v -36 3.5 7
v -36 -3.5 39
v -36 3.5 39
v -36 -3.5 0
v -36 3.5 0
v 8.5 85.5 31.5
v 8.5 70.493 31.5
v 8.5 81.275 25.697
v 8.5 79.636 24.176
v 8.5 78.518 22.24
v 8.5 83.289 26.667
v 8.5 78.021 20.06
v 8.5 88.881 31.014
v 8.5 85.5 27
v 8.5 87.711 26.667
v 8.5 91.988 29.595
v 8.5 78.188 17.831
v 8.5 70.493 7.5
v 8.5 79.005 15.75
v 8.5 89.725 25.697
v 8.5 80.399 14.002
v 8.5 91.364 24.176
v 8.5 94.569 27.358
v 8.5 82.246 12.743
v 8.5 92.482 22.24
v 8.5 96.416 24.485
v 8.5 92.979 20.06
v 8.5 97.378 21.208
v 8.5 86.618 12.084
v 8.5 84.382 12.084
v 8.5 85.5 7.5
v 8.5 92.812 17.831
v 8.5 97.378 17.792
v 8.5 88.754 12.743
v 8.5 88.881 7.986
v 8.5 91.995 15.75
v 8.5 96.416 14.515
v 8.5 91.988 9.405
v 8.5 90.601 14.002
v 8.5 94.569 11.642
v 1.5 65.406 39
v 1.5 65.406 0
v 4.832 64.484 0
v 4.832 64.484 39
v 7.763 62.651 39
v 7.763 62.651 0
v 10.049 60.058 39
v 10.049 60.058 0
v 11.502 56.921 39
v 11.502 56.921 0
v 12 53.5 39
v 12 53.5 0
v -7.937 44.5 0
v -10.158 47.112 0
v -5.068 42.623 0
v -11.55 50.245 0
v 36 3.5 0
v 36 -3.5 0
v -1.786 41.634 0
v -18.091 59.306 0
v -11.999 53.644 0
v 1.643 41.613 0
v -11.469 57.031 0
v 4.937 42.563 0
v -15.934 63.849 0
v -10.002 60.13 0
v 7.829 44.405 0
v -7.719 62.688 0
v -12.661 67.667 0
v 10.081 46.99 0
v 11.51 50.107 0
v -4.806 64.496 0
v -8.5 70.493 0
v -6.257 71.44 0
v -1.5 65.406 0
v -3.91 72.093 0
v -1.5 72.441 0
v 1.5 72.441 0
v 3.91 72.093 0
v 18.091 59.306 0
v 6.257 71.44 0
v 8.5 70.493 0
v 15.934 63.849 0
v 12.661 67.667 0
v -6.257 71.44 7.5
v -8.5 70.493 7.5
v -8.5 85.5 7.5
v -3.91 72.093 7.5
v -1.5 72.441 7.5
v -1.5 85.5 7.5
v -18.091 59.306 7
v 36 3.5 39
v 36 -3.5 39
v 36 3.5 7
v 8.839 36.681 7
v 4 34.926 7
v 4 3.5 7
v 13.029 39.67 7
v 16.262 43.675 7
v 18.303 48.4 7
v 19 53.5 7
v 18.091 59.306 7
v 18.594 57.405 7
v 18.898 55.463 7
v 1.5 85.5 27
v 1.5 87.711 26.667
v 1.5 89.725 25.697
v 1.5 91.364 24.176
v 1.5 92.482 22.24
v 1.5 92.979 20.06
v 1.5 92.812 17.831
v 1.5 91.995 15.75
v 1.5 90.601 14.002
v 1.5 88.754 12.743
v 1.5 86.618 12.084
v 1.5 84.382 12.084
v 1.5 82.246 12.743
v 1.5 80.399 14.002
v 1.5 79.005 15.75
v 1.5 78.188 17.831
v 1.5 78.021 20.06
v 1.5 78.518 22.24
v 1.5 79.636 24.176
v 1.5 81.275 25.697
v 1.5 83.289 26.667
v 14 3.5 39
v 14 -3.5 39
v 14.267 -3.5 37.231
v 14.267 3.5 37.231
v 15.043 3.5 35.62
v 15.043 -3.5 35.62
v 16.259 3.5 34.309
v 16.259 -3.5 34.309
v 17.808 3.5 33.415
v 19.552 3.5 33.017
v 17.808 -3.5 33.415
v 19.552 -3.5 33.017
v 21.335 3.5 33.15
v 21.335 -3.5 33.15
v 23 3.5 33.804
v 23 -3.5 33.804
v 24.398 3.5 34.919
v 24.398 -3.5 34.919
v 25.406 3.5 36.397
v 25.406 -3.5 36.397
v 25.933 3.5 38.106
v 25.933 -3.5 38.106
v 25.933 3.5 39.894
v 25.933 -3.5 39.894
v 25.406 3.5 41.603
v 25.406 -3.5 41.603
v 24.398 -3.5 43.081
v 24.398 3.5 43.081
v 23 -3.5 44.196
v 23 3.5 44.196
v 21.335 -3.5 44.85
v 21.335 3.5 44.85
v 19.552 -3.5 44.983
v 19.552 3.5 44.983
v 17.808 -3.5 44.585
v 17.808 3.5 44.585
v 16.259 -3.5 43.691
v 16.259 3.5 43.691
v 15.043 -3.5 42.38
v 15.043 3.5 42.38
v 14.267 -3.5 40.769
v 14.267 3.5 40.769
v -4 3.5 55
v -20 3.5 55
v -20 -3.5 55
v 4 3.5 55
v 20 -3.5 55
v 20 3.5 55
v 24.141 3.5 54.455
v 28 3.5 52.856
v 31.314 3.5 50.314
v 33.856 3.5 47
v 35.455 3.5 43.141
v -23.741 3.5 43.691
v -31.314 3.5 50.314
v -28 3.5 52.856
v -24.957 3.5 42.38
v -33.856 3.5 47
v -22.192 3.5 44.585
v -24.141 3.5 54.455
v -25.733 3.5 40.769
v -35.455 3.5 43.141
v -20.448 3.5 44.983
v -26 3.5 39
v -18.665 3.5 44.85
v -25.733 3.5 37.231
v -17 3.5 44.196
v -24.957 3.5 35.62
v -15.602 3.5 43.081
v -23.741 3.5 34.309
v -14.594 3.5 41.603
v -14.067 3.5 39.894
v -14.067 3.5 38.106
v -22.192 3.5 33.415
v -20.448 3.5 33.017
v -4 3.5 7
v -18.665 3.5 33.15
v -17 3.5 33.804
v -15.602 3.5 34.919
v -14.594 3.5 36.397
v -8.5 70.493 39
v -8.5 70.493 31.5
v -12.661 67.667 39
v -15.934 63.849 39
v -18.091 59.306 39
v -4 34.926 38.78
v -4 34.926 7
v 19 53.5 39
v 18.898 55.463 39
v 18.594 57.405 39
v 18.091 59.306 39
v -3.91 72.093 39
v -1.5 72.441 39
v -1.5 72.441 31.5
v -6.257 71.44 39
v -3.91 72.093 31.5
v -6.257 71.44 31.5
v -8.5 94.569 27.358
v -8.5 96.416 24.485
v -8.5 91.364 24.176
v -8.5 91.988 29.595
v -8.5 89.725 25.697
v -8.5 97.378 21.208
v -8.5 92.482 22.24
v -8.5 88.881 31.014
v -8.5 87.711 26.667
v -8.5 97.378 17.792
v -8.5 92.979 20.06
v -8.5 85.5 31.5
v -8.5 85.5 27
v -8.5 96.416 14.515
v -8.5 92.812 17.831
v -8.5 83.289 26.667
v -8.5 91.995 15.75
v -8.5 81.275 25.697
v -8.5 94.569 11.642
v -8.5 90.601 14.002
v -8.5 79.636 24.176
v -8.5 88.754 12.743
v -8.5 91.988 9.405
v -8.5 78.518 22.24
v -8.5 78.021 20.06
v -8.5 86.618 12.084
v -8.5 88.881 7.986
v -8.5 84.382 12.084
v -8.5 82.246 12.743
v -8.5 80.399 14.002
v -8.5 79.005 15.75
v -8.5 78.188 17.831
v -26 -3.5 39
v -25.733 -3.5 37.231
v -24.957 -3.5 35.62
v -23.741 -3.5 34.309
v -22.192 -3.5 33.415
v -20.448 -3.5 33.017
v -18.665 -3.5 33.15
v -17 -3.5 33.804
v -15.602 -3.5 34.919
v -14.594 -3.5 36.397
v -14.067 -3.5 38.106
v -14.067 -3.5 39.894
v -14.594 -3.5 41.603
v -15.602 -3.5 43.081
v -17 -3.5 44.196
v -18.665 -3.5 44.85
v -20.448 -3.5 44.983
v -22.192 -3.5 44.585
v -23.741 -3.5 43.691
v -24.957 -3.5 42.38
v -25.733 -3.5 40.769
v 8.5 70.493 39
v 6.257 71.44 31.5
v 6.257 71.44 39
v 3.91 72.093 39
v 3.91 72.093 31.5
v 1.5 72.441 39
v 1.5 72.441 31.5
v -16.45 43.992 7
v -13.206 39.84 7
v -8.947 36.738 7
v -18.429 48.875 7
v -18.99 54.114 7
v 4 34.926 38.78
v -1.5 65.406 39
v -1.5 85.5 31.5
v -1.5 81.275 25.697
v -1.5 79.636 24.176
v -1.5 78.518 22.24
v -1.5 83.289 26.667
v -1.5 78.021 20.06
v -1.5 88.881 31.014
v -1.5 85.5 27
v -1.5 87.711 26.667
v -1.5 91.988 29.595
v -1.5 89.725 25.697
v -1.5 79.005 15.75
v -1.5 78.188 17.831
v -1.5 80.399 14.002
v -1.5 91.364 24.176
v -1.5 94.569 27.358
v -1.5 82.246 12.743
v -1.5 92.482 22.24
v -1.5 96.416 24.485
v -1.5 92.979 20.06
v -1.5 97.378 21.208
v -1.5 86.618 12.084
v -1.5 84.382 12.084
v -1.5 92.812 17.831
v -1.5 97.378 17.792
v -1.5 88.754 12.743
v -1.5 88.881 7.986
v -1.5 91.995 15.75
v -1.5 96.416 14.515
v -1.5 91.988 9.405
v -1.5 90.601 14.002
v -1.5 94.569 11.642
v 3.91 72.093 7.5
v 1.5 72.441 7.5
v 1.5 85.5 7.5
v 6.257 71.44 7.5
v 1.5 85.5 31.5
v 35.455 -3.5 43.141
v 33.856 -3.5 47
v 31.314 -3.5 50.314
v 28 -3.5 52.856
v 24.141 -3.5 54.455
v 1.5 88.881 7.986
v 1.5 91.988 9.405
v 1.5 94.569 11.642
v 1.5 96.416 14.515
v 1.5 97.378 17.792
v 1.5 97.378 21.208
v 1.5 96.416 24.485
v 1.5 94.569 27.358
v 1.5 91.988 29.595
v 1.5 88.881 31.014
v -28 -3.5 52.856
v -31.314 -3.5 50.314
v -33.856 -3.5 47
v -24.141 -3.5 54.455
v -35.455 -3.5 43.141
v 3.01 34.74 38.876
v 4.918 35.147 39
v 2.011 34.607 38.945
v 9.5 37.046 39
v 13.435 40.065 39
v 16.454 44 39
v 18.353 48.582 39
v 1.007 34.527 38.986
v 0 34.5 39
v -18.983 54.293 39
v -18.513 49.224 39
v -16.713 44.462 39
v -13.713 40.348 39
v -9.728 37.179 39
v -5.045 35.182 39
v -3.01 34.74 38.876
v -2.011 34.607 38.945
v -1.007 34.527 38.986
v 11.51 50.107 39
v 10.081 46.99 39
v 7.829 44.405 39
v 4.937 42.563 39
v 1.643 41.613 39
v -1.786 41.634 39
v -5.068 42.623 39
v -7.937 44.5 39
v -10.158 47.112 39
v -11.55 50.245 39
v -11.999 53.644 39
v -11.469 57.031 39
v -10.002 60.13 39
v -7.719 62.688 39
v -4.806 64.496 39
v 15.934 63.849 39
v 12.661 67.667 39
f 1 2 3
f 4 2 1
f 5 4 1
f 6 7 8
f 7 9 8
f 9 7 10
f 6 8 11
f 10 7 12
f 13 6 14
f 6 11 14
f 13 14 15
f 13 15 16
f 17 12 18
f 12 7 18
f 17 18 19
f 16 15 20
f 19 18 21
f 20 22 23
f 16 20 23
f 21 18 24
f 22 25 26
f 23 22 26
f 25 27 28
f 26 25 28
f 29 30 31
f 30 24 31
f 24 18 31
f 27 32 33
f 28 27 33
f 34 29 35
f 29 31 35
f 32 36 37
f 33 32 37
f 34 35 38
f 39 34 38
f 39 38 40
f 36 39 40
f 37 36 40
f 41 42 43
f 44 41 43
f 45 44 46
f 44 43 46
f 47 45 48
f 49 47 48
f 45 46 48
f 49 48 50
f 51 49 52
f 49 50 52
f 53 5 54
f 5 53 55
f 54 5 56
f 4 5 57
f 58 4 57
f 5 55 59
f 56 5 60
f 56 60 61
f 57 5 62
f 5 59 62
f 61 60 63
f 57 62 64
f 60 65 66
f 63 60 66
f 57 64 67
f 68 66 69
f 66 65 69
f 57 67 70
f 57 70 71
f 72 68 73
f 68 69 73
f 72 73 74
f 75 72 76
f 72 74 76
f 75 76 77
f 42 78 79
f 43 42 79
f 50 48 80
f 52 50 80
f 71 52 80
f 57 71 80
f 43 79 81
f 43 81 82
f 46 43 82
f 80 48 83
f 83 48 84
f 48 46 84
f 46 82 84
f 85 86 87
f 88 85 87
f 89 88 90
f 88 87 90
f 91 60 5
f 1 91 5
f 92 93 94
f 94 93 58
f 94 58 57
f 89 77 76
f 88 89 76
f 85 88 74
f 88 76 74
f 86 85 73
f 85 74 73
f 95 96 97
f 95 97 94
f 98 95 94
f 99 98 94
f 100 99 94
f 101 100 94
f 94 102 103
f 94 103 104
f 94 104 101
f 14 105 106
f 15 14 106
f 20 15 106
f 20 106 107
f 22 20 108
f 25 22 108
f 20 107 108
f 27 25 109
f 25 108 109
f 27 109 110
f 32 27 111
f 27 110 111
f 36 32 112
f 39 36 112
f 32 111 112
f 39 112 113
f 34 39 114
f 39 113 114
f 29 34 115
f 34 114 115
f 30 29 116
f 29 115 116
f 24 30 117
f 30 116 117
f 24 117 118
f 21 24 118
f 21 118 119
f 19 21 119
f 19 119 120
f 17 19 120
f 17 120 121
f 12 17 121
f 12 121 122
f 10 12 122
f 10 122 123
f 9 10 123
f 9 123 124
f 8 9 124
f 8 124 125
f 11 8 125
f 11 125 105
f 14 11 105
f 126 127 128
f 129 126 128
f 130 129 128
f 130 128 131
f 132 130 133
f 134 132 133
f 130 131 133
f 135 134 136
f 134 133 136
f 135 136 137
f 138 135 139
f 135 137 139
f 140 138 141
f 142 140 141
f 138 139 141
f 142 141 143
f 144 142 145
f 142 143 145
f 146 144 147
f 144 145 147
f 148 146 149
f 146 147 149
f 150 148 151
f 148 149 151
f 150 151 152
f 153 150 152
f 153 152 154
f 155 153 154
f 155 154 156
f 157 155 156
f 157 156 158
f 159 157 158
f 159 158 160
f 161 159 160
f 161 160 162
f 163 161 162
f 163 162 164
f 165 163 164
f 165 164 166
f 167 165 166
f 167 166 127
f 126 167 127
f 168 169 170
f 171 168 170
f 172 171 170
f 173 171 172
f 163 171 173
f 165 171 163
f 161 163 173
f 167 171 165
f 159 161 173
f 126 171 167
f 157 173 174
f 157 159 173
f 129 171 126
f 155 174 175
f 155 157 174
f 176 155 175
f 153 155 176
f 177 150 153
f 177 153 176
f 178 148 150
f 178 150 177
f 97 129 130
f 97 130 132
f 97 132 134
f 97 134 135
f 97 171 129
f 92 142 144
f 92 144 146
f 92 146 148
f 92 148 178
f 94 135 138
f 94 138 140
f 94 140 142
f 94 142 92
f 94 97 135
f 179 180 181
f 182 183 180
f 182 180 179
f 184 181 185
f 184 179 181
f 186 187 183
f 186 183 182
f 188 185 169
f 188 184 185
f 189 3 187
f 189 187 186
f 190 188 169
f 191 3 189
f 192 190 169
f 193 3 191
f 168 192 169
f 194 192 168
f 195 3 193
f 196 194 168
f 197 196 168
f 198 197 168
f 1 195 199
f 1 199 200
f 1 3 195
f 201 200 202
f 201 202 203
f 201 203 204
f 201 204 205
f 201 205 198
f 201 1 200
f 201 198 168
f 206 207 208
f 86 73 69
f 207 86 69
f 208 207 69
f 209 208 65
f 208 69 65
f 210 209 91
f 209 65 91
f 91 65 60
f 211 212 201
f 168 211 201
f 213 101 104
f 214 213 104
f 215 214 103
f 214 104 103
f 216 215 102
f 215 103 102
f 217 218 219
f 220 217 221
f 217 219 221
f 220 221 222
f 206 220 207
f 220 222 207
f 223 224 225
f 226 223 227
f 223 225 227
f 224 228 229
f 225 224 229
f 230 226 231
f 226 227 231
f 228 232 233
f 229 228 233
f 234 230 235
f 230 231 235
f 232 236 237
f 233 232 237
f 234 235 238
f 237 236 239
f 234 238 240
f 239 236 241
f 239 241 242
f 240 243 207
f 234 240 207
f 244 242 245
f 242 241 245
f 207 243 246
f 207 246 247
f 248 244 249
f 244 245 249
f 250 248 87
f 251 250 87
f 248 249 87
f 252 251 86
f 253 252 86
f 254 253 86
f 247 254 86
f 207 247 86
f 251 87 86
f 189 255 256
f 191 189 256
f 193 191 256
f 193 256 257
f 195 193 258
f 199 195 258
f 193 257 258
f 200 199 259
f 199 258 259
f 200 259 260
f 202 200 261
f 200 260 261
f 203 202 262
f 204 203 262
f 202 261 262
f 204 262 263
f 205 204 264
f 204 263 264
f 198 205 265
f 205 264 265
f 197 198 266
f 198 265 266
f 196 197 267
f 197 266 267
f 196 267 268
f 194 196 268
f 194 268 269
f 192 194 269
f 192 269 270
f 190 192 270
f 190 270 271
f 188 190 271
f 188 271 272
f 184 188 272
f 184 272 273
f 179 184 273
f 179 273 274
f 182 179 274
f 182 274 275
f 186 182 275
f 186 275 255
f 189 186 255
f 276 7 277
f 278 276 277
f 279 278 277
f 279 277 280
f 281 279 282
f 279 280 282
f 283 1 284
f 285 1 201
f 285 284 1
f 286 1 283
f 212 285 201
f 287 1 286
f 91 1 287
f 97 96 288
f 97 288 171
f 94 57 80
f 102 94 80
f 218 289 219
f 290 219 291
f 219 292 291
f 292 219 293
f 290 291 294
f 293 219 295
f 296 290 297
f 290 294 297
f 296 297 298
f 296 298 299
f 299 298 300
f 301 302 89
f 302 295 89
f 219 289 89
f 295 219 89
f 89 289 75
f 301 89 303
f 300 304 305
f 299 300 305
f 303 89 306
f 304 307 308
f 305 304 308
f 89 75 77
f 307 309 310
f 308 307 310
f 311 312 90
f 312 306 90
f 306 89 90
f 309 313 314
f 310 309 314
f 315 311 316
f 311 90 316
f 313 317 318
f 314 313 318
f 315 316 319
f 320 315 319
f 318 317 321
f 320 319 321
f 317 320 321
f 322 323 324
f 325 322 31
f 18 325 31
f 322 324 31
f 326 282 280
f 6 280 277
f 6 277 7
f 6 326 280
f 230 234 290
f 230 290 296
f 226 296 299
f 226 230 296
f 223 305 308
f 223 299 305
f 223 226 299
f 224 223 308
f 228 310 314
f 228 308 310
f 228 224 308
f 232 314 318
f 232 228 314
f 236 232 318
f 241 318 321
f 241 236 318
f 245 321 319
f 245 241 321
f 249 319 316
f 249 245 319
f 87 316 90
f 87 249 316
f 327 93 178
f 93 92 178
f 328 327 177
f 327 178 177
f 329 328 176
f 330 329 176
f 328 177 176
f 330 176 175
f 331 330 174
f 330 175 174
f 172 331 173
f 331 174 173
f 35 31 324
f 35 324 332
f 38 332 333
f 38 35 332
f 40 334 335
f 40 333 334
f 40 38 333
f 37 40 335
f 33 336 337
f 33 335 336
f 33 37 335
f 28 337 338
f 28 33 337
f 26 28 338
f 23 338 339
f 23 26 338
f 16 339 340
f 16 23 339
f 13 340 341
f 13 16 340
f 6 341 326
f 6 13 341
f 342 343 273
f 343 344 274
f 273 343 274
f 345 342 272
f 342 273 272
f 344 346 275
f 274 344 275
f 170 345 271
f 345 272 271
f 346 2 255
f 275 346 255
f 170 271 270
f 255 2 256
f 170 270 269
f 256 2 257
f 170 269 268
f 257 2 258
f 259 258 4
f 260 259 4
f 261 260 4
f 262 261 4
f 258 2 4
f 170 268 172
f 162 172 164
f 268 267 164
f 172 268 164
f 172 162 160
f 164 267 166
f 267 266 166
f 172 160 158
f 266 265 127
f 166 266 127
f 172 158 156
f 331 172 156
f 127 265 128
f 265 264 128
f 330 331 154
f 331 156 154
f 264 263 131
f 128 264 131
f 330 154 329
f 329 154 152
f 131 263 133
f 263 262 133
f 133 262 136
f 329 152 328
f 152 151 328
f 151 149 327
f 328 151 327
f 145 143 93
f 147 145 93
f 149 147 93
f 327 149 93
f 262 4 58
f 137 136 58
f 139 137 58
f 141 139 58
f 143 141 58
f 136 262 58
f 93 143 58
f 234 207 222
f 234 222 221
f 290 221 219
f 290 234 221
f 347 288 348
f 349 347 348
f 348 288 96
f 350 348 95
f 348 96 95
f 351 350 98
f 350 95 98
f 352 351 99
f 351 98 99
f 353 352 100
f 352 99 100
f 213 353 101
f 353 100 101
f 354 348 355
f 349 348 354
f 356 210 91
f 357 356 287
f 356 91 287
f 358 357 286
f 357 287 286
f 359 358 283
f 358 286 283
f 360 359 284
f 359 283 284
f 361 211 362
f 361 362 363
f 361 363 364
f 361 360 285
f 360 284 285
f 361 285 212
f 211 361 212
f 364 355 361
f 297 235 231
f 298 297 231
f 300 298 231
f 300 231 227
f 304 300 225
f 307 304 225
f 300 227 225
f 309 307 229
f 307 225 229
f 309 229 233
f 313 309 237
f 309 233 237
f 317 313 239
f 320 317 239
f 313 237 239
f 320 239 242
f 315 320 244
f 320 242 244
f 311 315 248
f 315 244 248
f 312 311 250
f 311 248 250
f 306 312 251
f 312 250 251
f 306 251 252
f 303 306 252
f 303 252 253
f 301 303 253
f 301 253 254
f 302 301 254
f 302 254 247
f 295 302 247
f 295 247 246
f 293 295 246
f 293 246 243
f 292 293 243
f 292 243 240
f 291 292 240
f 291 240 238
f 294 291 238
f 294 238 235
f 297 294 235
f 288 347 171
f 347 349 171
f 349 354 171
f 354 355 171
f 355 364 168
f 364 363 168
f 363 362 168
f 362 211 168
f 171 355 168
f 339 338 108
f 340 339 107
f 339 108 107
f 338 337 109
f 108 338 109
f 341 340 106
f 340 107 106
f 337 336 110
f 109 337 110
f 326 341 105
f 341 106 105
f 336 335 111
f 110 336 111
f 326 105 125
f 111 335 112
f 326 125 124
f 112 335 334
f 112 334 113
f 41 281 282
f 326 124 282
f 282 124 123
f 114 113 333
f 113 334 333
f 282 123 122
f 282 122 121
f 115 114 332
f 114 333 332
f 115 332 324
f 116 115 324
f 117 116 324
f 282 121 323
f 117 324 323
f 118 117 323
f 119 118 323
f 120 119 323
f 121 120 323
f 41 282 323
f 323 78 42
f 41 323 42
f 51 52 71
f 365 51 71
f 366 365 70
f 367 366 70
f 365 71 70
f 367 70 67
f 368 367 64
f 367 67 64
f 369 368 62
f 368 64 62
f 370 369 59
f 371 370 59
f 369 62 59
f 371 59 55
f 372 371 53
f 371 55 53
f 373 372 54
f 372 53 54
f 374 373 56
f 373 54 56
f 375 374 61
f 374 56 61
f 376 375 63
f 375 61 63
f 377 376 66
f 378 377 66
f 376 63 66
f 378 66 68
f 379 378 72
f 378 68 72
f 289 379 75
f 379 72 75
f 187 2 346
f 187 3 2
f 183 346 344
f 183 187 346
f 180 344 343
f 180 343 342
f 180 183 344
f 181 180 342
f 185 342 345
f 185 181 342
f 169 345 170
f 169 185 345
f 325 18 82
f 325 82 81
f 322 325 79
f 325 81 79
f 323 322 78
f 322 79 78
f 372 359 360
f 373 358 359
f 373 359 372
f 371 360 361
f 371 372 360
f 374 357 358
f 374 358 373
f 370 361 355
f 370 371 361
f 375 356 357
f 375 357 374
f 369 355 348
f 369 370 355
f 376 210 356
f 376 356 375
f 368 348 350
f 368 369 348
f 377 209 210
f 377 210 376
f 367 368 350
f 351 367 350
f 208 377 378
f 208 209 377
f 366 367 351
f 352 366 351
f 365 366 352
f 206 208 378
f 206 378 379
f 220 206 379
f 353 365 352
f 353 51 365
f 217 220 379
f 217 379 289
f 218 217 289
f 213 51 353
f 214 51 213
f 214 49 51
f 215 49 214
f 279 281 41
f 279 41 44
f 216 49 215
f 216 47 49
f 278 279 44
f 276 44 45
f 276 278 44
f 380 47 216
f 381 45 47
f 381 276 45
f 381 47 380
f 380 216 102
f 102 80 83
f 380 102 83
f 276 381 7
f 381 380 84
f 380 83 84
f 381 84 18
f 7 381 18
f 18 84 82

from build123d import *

# Parameters (mm, degrees)
SKETCH1_W                  = 72
SKETCH1_H                  = 7
BOSS_EXTRUDE1_DEPTH        = 55
BOSS_EXTRUDE2_DEPTH        = 7
BOSS_EXTRUDE3_DEPTH        = 39
BOSS_EXTRUDE4_START        = 7.5
BOSS_EXTRUDE4_DEPTH        = 24
FILLET1_RADIUS             = 12
FILLET1_LENGTH             = 7
FILLET2_RADIUS             = 12
FILLET2_LENGTH             = 7
F_1_0MM_DOWEL_HOLE1_D      = 15
RIB1_REACH                 = 119.589
SKETCH4_WALL_W             = 272.06418258
SKETCH4_WALL_H             = 8
FILLET3_R                  = 16
F_12_0MM_DOWEL_HOLE1_D     = 12
F_12_0MM_DOWEL_HOLE1_DEPTH = 7


with BuildPart() as part:
    # Sketch1 → Boss-Extrude1 (new body)
    with BuildSketch(Plane.XY):
        Rectangle(SKETCH1_W, SKETCH1_H)
    extrude(amount=BOSS_EXTRUDE1_DEPTH)

    # Sketch1<3> → Boss-Extrude2 (add)
    with BuildSketch(Plane.XY):
        with BuildLine():
            ThreePointArc((19, 53.5), (-2.93819909, 34.728559296), (-18.091261695, 59.305708421))
            Line((-18.091261695, 59.305708421), (-36, 3.5))
            Line((-36, 3.5), (36, 3.5))
            Line((36, 3.5), (18.091261695, 59.305708421))
            ThreePointArc((18.091261695, 59.305708421), (18.771440704, 56.43819909), (19, 53.5))
        make_face()
    extrude(amount=BOSS_EXTRUDE2_DEPTH)

    # Sketch1<4> → Boss-Extrude3 (add)
    with BuildSketch(Plane.XY):
        with BuildLine():
            ThreePointArc((-8.5, 70.492645468), (-14.424308987, 65.866863395), (-18.091261695, 59.305708421))
            ThreePointArc((-18.091261695, 59.305708421), (-2.93819909, 34.728559296), (19, 53.5))
            ThreePointArc((19, 53.5), (18.771440704, 56.43819909), (18.091261695, 59.305708421))
            ThreePointArc((18.091261695, 59.305708421), (14.424308987, 65.866863395), (8.5, 70.492645468))
            ThreePointArc((8.5, 70.492645468), (5.093989215, 71.80440586), (1.5, 72.440696925))
            Line((1.5, 72.440696925), (1.5, 65.4058809))
            ThreePointArc((1.5, 65.4058809), (9, 61.437253933), (12, 53.5))
            ThreePointArc((12, 53.5), (-7.937253933, 44.5), (-1.5, 65.4058809))
            Line((-1.5, 65.4058809), (-1.5, 72.440696925))
            ThreePointArc((-1.5, 72.440696925), (-5.093989215, 71.80440586), (-8.5, 70.492645468))
        make_face()
    extrude(amount=BOSS_EXTRUDE3_DEPTH)

    # Sketch1<5> → Boss-Extrude4 (add)
    with BuildSketch(Plane.XY.offset(BOSS_EXTRUDE4_START)):
        with BuildLine():
            Line((1.5, 97.5), (1.5, 72.440696925))
            ThreePointArc((1.5, 72.440696925), (5.093989215, 71.80440586), (8.5, 70.492645468))
            Line((8.5, 70.492645468), (8.5, 97.5))
            Line((8.5, 97.5), (1.5, 97.5))
        make_face()
        with BuildLine():
            Line((-8.5, 97.5), (-8.5, 70.492645468))
            ThreePointArc((-8.5, 70.492645468), (-5.093989215, 71.80440586), (-1.5, 72.440696925))
            Line((-1.5, 72.440696925), (-1.5, 97.5))
            Line((-1.5, 97.5), (-8.5, 97.5))
        make_face()
    extrude(amount=BOSS_EXTRUDE4_DEPTH)

    # Fillet1: full round fillet: the end face becomes a half cylinder, R = half its width
    fillet1_face = Plane((5, 97.5, 19.5), x_dir=(1, 0, 0), z_dir=(0, 1, 0))  # on the end face: x along it, z out of the body
    fillet1_slab = fillet1_face.offset(-FILLET1_RADIUS / 2) * Box(FILLET1_LENGTH, 2 * FILLET1_RADIUS, FILLET1_RADIUS, mode=Mode.PRIVATE)  # the body's end, R deep
    fillet1_round = Plane((5, 85.5, 19.5), x_dir=(0, 1, 0), z_dir=(1, 0, 0)) * Cylinder(FILLET1_RADIUS, FILLET1_LENGTH, mode=Mode.PRIVATE)  # its axis R under the face
    add(fillet1_slab - fillet1_round, mode=Mode.SUBTRACT)

    # Fillet2: full round fillet: the end face becomes a half cylinder, R = half its width
    fillet2_face = Plane((-5, 97.5, 19.5), x_dir=(-1, 0, 0), z_dir=(0, 1, 0))  # on the end face: x along it, z out of the body
    fillet2_slab = fillet2_face.offset(-FILLET2_RADIUS / 2) * Box(FILLET2_LENGTH, 2 * FILLET2_RADIUS, FILLET2_RADIUS, mode=Mode.PRIVATE)  # the body's end, R deep
    fillet2_round = Plane((-5, 85.5, 19.5), x_dir=(0, 1, 0), z_dir=(-1, 0, 0)) * Cylinder(FILLET2_RADIUS, FILLET2_LENGTH, mode=Mode.PRIVATE)  # its axis R under the face
    add(fillet2_slab - fillet2_round, mode=Mode.SUBTRACT)

    # Ø1.0mm Dowel Hole1 (through all)
    with Locations(Plane(origin=(8.5, 0, 0), x_dir=(0, 0, -1), z_dir=(1, 0, 0))):
        with Locations((-19.5, 85.5)):
            Hole(F_1_0MM_DOWEL_HOLE1_D / 2)

    # Sketch4 wall → Rib1 (add, up to next)
    with BuildSketch(Plane(origin=(0, 19, 47), x_dir=(0, -0.888620657055, 0.45864291977), z_dir=(0, -0.45864291977, -0.888620657055)), mode=Mode.PRIVATE) as rib1_sk1:
        Rectangle(SKETCH4_WALL_W, SKETCH4_WALL_H)
    rib1_tool1 = extrude(rib1_sk1.sketch, amount=RIB1_REACH, mode=Mode.PRIVATE) - part.part
    add(rib1_tool1.solids().sort_by_distance((0, 19, 47))[0])

    # Fillet3
    fillet3_edges = [part.edges().sort_by_distance(p)[0] for p in [
        (36, 0, 55),
        (-36, 0, 55),
    ]]
    fillet(fillet3_edges, radius=FILLET3_R)

    # Ø12.0mm Dowel Hole1
    with Locations(Plane(origin=(0, 3.5, 0), x_dir=(1, 0, 0), z_dir=(0, 1, 0))):
        with Locations((20, -39), (-20, -39)):
            Hole(F_12_0MM_DOWEL_HOLE1_D / 2, depth=F_12_0MM_DOWEL_HOLE1_DEPTH)


solid = part.part
